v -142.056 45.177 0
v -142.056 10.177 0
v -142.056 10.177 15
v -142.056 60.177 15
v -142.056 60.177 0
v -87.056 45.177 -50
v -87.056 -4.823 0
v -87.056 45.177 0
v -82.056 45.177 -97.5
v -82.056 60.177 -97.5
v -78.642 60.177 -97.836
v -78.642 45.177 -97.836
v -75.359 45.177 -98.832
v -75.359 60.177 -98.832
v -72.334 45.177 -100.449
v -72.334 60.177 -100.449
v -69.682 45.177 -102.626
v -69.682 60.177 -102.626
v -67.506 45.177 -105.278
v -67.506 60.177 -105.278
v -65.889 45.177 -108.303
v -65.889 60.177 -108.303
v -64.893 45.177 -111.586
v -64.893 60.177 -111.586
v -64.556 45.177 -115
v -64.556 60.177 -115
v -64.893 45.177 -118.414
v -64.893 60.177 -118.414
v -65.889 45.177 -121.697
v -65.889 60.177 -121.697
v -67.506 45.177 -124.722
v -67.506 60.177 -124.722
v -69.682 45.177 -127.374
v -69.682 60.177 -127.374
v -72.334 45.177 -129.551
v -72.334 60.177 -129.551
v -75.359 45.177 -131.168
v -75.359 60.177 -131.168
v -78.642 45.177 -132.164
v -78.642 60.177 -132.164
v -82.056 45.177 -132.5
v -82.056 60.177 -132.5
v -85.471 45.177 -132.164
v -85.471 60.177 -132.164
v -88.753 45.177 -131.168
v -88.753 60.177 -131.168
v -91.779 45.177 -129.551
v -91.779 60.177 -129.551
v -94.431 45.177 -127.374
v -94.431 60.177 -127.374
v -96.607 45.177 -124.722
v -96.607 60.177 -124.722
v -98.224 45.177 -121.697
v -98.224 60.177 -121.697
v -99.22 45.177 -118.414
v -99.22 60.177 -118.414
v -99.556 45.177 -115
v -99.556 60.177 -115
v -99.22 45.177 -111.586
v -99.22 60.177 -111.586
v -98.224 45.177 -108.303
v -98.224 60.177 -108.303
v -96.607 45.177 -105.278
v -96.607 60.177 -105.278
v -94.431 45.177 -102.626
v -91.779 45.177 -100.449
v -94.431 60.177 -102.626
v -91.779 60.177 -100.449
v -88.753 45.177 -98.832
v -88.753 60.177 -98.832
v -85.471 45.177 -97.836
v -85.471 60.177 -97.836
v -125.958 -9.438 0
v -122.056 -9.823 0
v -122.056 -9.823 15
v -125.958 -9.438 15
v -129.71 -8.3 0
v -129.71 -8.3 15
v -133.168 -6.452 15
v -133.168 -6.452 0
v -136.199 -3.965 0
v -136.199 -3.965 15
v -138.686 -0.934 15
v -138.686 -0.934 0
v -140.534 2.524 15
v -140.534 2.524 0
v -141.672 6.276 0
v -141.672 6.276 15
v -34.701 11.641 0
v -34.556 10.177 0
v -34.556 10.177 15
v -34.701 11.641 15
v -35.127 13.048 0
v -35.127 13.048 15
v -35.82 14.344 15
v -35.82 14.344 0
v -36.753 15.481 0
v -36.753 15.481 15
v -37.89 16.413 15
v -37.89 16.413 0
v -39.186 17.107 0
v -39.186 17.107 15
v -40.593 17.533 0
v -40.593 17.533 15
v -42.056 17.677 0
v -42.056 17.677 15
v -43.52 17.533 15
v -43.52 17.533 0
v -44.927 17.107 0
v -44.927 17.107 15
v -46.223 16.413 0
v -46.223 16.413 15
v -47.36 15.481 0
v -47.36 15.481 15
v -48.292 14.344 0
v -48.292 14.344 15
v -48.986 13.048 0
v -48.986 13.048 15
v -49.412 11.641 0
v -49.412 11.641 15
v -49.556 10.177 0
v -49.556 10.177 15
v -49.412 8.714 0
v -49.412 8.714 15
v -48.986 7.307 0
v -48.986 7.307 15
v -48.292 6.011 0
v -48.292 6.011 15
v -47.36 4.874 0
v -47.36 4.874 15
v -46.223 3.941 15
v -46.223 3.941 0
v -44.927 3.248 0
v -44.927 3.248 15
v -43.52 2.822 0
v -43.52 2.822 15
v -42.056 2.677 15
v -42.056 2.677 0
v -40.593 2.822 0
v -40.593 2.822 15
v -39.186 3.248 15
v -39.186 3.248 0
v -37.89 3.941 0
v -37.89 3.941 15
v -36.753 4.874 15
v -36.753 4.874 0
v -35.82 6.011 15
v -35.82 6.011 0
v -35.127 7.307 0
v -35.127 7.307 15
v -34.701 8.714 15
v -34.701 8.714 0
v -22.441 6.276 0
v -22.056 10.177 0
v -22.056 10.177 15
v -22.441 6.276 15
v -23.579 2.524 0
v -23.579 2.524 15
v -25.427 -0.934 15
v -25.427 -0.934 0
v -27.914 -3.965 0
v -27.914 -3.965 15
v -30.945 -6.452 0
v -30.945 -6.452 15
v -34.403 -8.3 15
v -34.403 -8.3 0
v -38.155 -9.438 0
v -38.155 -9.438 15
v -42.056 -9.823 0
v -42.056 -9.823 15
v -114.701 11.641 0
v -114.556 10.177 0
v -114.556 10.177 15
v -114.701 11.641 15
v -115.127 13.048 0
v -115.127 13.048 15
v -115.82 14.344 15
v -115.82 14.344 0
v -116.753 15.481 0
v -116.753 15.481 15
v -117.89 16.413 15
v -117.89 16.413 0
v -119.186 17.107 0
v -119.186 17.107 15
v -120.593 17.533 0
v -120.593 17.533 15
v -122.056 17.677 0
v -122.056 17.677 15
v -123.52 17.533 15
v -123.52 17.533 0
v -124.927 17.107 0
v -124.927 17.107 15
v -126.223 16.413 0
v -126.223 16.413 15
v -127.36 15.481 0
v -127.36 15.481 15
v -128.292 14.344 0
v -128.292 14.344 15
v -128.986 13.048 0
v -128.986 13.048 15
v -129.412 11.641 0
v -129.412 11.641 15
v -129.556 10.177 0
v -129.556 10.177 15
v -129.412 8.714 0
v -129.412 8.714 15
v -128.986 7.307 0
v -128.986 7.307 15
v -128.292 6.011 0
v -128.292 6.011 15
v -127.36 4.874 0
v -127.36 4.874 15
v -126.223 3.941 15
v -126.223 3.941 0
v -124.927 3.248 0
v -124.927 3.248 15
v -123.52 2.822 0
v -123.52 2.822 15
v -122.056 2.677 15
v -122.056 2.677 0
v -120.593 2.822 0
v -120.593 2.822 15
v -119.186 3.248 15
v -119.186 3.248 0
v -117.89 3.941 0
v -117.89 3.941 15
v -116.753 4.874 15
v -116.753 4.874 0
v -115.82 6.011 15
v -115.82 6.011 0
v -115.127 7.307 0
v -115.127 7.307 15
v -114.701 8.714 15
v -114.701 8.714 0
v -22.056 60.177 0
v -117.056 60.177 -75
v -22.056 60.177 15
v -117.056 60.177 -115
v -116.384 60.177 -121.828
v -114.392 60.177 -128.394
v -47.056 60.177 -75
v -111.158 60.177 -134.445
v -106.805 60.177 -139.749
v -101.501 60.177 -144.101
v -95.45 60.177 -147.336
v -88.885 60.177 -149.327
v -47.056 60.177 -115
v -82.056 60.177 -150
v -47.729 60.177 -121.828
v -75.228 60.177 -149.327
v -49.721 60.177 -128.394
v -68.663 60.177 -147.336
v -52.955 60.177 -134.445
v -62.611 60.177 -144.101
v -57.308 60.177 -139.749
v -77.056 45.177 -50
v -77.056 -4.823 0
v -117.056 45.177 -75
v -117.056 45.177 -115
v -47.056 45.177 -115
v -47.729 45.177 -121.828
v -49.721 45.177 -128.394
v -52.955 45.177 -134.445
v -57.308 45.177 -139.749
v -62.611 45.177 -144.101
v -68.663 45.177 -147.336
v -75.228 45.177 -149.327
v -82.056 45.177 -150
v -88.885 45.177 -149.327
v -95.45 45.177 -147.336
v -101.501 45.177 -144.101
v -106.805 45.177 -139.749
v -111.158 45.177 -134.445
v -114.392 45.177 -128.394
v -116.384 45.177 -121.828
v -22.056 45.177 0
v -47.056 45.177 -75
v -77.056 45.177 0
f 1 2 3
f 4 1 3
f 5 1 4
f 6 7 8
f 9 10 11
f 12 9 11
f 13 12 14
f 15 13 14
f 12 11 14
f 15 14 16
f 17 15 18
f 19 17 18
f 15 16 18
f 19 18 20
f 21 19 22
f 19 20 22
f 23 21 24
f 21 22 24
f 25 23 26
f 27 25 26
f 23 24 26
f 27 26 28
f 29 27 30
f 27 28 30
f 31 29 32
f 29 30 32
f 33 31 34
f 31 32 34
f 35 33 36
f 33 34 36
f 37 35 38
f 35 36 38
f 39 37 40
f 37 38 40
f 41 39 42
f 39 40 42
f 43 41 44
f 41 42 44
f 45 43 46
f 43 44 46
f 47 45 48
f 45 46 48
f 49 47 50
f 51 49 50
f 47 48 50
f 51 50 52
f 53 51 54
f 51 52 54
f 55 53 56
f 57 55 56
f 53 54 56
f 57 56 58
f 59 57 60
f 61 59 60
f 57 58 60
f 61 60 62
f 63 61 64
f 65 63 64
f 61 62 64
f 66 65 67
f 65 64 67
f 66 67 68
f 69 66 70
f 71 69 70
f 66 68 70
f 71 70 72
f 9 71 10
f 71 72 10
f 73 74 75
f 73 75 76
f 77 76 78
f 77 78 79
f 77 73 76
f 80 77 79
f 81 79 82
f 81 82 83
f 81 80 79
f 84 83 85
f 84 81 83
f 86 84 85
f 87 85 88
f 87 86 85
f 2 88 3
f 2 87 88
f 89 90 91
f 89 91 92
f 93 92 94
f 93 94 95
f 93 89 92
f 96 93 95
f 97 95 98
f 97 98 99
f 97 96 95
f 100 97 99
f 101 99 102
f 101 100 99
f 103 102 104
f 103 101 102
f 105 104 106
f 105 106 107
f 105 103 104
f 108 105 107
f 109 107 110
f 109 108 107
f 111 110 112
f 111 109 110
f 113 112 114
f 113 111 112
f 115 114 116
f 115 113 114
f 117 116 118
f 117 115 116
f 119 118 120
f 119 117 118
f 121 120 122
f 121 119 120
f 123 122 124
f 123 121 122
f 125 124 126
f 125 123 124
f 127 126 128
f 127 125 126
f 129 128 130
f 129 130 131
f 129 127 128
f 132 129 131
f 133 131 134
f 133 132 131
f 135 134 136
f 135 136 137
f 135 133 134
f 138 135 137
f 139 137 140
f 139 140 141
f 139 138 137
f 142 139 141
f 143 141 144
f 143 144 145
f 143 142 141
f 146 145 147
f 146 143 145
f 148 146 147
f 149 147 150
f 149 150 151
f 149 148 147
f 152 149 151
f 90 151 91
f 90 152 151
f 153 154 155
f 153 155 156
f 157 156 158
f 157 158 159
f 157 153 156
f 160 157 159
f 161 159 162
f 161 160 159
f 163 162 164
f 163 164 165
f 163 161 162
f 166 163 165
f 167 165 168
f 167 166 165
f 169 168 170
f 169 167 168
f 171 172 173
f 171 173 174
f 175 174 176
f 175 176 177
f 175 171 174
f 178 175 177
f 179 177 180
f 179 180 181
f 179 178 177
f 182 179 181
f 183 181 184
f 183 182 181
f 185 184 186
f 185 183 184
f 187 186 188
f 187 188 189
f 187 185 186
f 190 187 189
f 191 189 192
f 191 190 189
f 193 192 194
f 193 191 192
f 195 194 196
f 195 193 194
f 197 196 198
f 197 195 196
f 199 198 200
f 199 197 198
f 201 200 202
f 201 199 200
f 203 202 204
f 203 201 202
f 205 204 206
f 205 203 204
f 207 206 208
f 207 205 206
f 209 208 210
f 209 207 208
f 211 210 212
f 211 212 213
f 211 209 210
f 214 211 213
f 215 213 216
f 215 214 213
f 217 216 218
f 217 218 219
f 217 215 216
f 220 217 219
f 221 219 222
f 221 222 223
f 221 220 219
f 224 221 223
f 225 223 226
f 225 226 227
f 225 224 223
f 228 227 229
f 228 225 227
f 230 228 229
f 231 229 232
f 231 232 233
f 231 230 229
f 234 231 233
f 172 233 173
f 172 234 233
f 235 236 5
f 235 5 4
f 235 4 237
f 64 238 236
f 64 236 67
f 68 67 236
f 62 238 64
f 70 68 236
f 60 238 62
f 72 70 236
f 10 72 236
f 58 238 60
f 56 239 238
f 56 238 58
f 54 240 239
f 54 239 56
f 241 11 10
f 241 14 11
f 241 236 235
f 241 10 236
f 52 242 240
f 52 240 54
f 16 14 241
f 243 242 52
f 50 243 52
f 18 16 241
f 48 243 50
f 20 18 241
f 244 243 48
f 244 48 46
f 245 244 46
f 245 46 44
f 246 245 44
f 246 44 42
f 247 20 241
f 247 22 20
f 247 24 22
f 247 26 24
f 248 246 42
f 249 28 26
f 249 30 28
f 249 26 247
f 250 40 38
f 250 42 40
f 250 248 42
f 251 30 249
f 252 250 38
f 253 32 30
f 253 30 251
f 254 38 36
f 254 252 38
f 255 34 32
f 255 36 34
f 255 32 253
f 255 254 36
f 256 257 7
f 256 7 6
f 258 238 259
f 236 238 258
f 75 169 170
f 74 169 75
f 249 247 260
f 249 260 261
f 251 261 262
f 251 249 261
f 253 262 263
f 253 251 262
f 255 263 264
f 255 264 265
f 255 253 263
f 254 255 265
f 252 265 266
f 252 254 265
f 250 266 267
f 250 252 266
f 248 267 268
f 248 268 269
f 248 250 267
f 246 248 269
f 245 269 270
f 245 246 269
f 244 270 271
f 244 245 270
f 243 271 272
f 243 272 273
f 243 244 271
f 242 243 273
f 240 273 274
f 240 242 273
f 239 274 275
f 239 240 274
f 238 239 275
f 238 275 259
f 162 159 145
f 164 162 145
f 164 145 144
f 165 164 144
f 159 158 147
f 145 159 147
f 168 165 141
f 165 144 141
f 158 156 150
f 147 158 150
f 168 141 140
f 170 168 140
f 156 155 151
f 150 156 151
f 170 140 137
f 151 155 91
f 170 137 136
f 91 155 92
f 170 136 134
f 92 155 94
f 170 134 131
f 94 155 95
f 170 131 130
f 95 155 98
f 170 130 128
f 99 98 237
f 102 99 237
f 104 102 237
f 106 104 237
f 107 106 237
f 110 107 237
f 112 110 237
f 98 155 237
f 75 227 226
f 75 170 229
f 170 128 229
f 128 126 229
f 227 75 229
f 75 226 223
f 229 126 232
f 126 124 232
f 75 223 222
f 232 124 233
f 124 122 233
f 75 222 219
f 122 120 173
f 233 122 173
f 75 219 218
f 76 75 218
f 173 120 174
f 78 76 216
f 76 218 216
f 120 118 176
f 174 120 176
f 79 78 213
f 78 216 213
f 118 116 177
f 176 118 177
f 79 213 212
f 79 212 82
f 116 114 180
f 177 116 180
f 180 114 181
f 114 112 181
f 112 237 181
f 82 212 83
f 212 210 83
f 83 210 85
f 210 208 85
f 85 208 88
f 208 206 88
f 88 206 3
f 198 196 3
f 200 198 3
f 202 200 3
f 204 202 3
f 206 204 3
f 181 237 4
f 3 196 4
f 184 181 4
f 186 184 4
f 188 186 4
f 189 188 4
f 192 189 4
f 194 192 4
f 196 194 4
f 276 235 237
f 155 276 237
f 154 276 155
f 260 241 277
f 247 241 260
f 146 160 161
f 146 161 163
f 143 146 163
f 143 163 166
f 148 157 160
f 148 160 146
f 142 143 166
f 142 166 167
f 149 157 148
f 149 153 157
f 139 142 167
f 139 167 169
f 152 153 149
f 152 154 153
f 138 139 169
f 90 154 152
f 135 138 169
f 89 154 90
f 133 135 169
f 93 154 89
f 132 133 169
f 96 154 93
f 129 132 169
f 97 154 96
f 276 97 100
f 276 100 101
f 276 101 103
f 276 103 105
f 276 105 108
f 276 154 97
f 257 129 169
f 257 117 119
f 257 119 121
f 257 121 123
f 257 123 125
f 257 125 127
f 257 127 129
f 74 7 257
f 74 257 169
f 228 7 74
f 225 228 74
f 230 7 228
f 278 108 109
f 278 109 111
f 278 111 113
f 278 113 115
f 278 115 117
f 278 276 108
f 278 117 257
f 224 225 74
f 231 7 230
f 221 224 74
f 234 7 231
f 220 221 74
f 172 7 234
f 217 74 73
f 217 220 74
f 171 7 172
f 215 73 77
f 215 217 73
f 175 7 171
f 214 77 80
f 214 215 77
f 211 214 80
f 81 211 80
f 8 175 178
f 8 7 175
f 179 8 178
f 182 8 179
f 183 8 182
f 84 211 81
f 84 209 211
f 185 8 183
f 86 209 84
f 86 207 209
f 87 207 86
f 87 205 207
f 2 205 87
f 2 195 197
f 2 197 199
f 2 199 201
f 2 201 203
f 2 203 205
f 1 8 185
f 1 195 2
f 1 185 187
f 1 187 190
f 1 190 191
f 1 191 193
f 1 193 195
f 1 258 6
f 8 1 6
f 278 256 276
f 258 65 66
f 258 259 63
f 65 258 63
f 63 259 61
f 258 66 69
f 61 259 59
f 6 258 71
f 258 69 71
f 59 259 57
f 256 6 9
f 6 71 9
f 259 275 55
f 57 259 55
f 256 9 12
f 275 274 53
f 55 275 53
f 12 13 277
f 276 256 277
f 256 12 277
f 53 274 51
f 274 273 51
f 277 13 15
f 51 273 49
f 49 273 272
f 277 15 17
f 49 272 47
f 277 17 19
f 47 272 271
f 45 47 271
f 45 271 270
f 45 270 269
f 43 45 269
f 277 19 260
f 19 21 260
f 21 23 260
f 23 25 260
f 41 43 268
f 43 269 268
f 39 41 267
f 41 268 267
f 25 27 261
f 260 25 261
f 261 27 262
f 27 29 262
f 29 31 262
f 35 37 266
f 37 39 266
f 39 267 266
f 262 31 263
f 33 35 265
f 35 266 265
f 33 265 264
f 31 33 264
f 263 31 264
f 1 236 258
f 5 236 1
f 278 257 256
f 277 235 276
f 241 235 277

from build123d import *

# Parameters (mm, degrees)
IZIM1_R                     = 7.5
Y_KSEKLIK_EKSTR_ZYON1_DEPTH = 15
IZIM2_R                     = 17.5
Y_KSEKLIK_EKSTR_ZYON2_DEPTH = 15
FEDER1_REACH                = 174.399
IZIM4_WALL_W                = 417.508136348
IZIM4_WALL_H                = 10


with BuildPart() as part:
    # Çizim1 → Yükseklik-Ekstrüzyon1 (new body)
    with BuildSketch(Plane.XY):
        with BuildLine():
            Line((-142.056451613, 60.177419355), (-22.056451613, 60.177419355))
            Line((-22.056451613, 60.177419355), (-22.056451613, 10.177419355))
            ThreePointArc((-22.056451613, 10.177419355), (-27.914315989, -3.964716269), (-42.056451613, -9.822580645))
            Line((-42.056451613, -9.822580645), (-122.056451613, -9.822580645))
            ThreePointArc((-122.056451613, -9.822580645), (-136.198587237, -3.964716269), (-142.056451613, 10.177419355))
            Line((-142.056451613, 10.177419355), (-142.056451613, 60.177419355))
        make_face()
        with Locations((-122.056451613, 10.177419355)):
            Circle(IZIM1_R, mode=Mode.SUBTRACT)
        with Locations((-42.056451613, 10.177419355)):
            Circle(IZIM1_R, mode=Mode.SUBTRACT)
    extrude(amount=Y_KSEKLIK_EKSTR_ZYON1_DEPTH)

    # Çizim2 → Yükseklik-Ekstrüzyon2 (add)
    with BuildSketch(Plane(origin=(0, 60.177419355, 0), x_dir=(1, 0, 0), z_dir=(0, 1, 0))):
        with BuildLine():
            Line((-117.056451613, 115), (-117.056451613, 75))
            Line((-117.056451613, 75), (-142.056451613, 0))
            Line((-142.056451613, 0), (-22.056451613, 0))
            Line((-22.056451613, 0), (-47.056451613, 75))
            Line((-47.056451613, 75), (-47.056451613, 115))
            ThreePointArc((-47.056451613, 115), (-82.056451613, 150), (-117.056451613, 115))
        make_face()
        with Locations(Location((-82.056451613, 115, 0), (0, 0, 270))):
            Circle(IZIM2_R, mode=Mode.SUBTRACT)
    extrude(amount=-Y_KSEKLIK_EKSTR_ZYON2_DEPTH)

    # Çizim4 wall → Feder1 (add, up to next)
    with BuildSketch(Plane(origin=(-82.056451613, 20.177419355, -25), x_dir=(0, 0.707106781187, -0.707106781187), z_dir=(0, -0.707106781187, -0.707106781187)), mode=Mode.PRIVATE) as feder1_sk1:
        Rectangle(IZIM4_WALL_W, IZIM4_WALL_H)
    feder1_tool1 = extrude(feder1_sk1.sketch, amount=-FEDER1_REACH, mode=Mode.PRIVATE) - part.part
    add(feder1_tool1.solids().sort_by_distance((-82.056451613, 20.177419355, -25))[0])


solid = part.part
